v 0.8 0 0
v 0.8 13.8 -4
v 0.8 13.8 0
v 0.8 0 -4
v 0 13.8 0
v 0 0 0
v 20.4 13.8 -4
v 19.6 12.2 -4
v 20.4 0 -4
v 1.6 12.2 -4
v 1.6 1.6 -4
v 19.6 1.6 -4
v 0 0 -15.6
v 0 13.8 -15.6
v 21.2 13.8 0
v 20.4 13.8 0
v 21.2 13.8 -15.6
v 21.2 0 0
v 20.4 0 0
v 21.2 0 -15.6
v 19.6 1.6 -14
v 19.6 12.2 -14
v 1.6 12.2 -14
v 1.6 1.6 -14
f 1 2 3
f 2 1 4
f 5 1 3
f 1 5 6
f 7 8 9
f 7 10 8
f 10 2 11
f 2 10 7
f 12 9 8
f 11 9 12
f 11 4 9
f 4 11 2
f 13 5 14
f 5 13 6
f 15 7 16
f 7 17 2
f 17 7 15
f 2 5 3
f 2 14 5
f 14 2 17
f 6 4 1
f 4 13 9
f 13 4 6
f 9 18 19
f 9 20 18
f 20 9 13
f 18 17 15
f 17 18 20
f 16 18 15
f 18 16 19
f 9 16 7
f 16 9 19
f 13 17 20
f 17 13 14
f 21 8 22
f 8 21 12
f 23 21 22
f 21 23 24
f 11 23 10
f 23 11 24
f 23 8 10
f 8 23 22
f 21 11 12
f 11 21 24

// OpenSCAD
// file: ../lib/barb.scad
// lib/barb.scad — hose barb: a rotate_extrude of a 2D (r, z) profile, axis +Z from z=0.
// Reproduces valveV2's connector (outlet, flanged) and connector_8mm (inlet) sketches:
//   a shank of shank_d carrying `ridges` crests of ridge_d; each crest rises on a face `steep`°
//   from the axis (on the base side) and tapers back to the shank over taper_len; the last
//   taper ends at tip_d on the end face z=len; bore through.
//   flange = [d, h]: a cone from ø d on z=0 to the shank at z=h (v2 exitSupport), undef = none.
//   gap: shank between the end of one taper and the next crest. v2 constrains it to 2 in both
//   sketches (DistanceX 2), so the 9-argument call reproduces v2; params.scad's barb_ridge_gap
//   is the same number for callers that want it explicit.
// The caller's $fn sets the roundness (use fn_round: these seal).

// z of crest i (0-based, counted from the base): the last crest is taper_len short of the end.
function barb_crest_z(len, ridges, taper_len, gap, i) = len - taper_len - (ridges - 1 - i)*(taper_len + gap);
// axial length of a crest's steep rise
function barb_rise_dz(shank_d, ridge_d, steep) = (ridge_d - shank_d)/2/tan(steep);

// Drop consecutive duplicate points (a rise that starts exactly where the shank starts).
function _dedupe(p, i=0, acc=[]) =
    i >= len(p) ? acc
    : _dedupe(p, i + 1, (len(acc) > 0 && norm(p[i] - acc[len(acc) - 1]) < 1e-9) ? acc : concat(acc, [p[i]]));

// The (r, z) polygon: base face, shank, crests, end face, back along the bore.
function barb_profile(bore, shank_d, ridge_d, len, ridges, taper_len, tip_d, steep, flange, gap=2) =
    let(rb = bore/2, rs = shank_d/2, rr = ridge_d/2, rt = tip_d/2,
        dz = barb_rise_dz(shank_d, ridge_d, steep),
        z_shank0 = is_undef(flange) ? 0 : flange[1],
        base = is_undef(flange) ? [[rb, 0], [rs, 0]] : [[rb, 0], [flange[0]/2, 0], [rs, flange[1]]],
        crests = [for (i = [0 : ridges - 1]) let(zc = barb_crest_z(len, ridges, taper_len, gap, i))
                    each [[rs, zc - dz], [rr, zc], i == ridges - 1 ? [rt, len] : [rs, zc + taper_len]]],
        ok = assert(ridges >= 1, "barb: ridges >= 1")
             assert(rr > rs && rs > rb && rt >= rb, "barb: need ridge_d > shank_d > bore and tip_d >= bore")
             assert(barb_crest_z(len, ridges, taper_len, gap, 0) - dz >= z_shank0 - 1e-9,
                    "barb: first crest rises before the shank starts: shorter flange, fewer ridges or a longer barb")
             assert(gap >= dz - 1e-9, "barb: gap shorter than the crest rise")
             true)
    _dedupe(concat(base, crests, [[rb, len]]));

module barb(bore, shank_d, ridge_d, len, ridges, taper_len, tip_d, steep, flange, gap=2) {
    rotate_extrude()
        polygon(barb_profile(bore, shank_d, ridge_d, len, ridges, taper_len, tip_d, steep, flange, gap));
}
// main file
// parts/end_cap.scad — closes the front (servo end) of the manifold [v2 Body004 end_cap].
//
// A block x∈[0,W], y∈[0,top_y], z∈[z_cap0, −joint_len]: the front wall (`wall` thick; the servo
// holder stands on it and shares its front face) plus the walls of a cavity `extra_len` long
// where the water turns before the first gate [v2 Sketch013 / Pad007, Sketch026 / Pocket005].
// Toward the body the block carries a ring `joint_len` long that laps over the body's front
// end [v2 Sketch014 / Pad008]: just the two side skins x∈[0, wall/2] (mirrored). Unlike v2's
// closed ring there is NO floor skin and NO top bar: the body's full-thickness front floor and
// the lid plate's front extension butt the block face instead (v2's floor skin there floated
// 0.8 mm above the bed; a top bar would leave the lid lip hanging 4 mm past its plate, a
// cantilever 0.8 mm above the bed in the lid's print orientation). The body's inner half side
// walls and the lid lip land between the skins; joint_clear is taken on the body and lid side,
// so the skins are nominal.
// v2's 0.4 lead-in chamfer on the ring's inner edges is not reproduced (the brief lists none).
//
// end_cap_outlet: an inlet barb through the front wall on the gallery axis, pointing −Z, for
// daisy-chaining manifolds. It is modelled rather than refused so the assembly shows the
// clash: the screw gear hangs in front of the plate over the same heights as the barb's first
// ridge. Moving the servo holder out of its way is out of scope.

include <../params.scad>
use <../lib/barb.scad>
$fn = fn_round;

for_print = false;

z_cav0 = -(joint_len + extra_len);   // cavity front face = inside of the front wall
eps    = 0.01;

// extents in the assembly frame; the barb, when present, is inside the block's x and y
function end_cap_bbox() = [[0, 0, z_cap0 - (end_cap_outlet ? inlet_barb[3] : 0)], [W, top_y, 0]];
function end_cap_size() = end_cap_bbox()[1] - end_cap_bbox()[0];

module end_cap() {
    difference() {
        union() {
            // block: front wall + cavity walls [v2 Pad007 = wallThickness + extraLength]
            translate([0, 0, z_cap0]) cube([W, top_y, wall + extra_len]);
            // ring [v2 Pad008 without its floor skin or top bar]: two side skins
            for (x0 = [0, W - wall/2]) translate([x0, 0, -joint_len]) cube([wall/2, top_y, joint_len]);
            if (end_cap_outlet)
                translate([W/2, gal_y, z_cap0]) rotate([180, 0, 0])   // +Z of the barb → −Z
                    barb(inlet_barb[0], inlet_barb[1], inlet_barb[2], inlet_barb[3], barb_ridges,
                         inlet_barb_prof[0], inlet_barb_prof[1], barb_steep, undef, barb_ridge_gap);
        }
        // water cavity, open toward the body (the overshoot ends inside the U, which is void there)
        translate([wall, wall, z_cav0]) cube([inner_w, inner_h, extra_len + eps]);
        // bore through the front wall, continuing the barb's own bore
        if (end_cap_outlet)
            translate([W/2, gal_y, z_cap0 - inlet_barb[3] - eps])
                cylinder(d=inlet_barb[0], h=inlet_barb[3] + wall + 2*eps);
    }
}

// Front wall on the bed: cavity and ring open upward, the U's skins stand as 0.8 mm walls.
// With the outlet barb the part is turned over instead — ring end on the bed, barb up — and
// the front wall then bridges the cavity (inner_w wide): out of scope, printable with care.
module end_cap_print() {
    if (end_cap_outlet) translate([W, 0, 0]) rotate([0, 180, 0]) end_cap();
    else translate([0, 0, -z_cap0]) end_cap();
}

if (is_undef(ASSEMBLY)) { if (for_print) end_cap_print(); else end_cap(); }
